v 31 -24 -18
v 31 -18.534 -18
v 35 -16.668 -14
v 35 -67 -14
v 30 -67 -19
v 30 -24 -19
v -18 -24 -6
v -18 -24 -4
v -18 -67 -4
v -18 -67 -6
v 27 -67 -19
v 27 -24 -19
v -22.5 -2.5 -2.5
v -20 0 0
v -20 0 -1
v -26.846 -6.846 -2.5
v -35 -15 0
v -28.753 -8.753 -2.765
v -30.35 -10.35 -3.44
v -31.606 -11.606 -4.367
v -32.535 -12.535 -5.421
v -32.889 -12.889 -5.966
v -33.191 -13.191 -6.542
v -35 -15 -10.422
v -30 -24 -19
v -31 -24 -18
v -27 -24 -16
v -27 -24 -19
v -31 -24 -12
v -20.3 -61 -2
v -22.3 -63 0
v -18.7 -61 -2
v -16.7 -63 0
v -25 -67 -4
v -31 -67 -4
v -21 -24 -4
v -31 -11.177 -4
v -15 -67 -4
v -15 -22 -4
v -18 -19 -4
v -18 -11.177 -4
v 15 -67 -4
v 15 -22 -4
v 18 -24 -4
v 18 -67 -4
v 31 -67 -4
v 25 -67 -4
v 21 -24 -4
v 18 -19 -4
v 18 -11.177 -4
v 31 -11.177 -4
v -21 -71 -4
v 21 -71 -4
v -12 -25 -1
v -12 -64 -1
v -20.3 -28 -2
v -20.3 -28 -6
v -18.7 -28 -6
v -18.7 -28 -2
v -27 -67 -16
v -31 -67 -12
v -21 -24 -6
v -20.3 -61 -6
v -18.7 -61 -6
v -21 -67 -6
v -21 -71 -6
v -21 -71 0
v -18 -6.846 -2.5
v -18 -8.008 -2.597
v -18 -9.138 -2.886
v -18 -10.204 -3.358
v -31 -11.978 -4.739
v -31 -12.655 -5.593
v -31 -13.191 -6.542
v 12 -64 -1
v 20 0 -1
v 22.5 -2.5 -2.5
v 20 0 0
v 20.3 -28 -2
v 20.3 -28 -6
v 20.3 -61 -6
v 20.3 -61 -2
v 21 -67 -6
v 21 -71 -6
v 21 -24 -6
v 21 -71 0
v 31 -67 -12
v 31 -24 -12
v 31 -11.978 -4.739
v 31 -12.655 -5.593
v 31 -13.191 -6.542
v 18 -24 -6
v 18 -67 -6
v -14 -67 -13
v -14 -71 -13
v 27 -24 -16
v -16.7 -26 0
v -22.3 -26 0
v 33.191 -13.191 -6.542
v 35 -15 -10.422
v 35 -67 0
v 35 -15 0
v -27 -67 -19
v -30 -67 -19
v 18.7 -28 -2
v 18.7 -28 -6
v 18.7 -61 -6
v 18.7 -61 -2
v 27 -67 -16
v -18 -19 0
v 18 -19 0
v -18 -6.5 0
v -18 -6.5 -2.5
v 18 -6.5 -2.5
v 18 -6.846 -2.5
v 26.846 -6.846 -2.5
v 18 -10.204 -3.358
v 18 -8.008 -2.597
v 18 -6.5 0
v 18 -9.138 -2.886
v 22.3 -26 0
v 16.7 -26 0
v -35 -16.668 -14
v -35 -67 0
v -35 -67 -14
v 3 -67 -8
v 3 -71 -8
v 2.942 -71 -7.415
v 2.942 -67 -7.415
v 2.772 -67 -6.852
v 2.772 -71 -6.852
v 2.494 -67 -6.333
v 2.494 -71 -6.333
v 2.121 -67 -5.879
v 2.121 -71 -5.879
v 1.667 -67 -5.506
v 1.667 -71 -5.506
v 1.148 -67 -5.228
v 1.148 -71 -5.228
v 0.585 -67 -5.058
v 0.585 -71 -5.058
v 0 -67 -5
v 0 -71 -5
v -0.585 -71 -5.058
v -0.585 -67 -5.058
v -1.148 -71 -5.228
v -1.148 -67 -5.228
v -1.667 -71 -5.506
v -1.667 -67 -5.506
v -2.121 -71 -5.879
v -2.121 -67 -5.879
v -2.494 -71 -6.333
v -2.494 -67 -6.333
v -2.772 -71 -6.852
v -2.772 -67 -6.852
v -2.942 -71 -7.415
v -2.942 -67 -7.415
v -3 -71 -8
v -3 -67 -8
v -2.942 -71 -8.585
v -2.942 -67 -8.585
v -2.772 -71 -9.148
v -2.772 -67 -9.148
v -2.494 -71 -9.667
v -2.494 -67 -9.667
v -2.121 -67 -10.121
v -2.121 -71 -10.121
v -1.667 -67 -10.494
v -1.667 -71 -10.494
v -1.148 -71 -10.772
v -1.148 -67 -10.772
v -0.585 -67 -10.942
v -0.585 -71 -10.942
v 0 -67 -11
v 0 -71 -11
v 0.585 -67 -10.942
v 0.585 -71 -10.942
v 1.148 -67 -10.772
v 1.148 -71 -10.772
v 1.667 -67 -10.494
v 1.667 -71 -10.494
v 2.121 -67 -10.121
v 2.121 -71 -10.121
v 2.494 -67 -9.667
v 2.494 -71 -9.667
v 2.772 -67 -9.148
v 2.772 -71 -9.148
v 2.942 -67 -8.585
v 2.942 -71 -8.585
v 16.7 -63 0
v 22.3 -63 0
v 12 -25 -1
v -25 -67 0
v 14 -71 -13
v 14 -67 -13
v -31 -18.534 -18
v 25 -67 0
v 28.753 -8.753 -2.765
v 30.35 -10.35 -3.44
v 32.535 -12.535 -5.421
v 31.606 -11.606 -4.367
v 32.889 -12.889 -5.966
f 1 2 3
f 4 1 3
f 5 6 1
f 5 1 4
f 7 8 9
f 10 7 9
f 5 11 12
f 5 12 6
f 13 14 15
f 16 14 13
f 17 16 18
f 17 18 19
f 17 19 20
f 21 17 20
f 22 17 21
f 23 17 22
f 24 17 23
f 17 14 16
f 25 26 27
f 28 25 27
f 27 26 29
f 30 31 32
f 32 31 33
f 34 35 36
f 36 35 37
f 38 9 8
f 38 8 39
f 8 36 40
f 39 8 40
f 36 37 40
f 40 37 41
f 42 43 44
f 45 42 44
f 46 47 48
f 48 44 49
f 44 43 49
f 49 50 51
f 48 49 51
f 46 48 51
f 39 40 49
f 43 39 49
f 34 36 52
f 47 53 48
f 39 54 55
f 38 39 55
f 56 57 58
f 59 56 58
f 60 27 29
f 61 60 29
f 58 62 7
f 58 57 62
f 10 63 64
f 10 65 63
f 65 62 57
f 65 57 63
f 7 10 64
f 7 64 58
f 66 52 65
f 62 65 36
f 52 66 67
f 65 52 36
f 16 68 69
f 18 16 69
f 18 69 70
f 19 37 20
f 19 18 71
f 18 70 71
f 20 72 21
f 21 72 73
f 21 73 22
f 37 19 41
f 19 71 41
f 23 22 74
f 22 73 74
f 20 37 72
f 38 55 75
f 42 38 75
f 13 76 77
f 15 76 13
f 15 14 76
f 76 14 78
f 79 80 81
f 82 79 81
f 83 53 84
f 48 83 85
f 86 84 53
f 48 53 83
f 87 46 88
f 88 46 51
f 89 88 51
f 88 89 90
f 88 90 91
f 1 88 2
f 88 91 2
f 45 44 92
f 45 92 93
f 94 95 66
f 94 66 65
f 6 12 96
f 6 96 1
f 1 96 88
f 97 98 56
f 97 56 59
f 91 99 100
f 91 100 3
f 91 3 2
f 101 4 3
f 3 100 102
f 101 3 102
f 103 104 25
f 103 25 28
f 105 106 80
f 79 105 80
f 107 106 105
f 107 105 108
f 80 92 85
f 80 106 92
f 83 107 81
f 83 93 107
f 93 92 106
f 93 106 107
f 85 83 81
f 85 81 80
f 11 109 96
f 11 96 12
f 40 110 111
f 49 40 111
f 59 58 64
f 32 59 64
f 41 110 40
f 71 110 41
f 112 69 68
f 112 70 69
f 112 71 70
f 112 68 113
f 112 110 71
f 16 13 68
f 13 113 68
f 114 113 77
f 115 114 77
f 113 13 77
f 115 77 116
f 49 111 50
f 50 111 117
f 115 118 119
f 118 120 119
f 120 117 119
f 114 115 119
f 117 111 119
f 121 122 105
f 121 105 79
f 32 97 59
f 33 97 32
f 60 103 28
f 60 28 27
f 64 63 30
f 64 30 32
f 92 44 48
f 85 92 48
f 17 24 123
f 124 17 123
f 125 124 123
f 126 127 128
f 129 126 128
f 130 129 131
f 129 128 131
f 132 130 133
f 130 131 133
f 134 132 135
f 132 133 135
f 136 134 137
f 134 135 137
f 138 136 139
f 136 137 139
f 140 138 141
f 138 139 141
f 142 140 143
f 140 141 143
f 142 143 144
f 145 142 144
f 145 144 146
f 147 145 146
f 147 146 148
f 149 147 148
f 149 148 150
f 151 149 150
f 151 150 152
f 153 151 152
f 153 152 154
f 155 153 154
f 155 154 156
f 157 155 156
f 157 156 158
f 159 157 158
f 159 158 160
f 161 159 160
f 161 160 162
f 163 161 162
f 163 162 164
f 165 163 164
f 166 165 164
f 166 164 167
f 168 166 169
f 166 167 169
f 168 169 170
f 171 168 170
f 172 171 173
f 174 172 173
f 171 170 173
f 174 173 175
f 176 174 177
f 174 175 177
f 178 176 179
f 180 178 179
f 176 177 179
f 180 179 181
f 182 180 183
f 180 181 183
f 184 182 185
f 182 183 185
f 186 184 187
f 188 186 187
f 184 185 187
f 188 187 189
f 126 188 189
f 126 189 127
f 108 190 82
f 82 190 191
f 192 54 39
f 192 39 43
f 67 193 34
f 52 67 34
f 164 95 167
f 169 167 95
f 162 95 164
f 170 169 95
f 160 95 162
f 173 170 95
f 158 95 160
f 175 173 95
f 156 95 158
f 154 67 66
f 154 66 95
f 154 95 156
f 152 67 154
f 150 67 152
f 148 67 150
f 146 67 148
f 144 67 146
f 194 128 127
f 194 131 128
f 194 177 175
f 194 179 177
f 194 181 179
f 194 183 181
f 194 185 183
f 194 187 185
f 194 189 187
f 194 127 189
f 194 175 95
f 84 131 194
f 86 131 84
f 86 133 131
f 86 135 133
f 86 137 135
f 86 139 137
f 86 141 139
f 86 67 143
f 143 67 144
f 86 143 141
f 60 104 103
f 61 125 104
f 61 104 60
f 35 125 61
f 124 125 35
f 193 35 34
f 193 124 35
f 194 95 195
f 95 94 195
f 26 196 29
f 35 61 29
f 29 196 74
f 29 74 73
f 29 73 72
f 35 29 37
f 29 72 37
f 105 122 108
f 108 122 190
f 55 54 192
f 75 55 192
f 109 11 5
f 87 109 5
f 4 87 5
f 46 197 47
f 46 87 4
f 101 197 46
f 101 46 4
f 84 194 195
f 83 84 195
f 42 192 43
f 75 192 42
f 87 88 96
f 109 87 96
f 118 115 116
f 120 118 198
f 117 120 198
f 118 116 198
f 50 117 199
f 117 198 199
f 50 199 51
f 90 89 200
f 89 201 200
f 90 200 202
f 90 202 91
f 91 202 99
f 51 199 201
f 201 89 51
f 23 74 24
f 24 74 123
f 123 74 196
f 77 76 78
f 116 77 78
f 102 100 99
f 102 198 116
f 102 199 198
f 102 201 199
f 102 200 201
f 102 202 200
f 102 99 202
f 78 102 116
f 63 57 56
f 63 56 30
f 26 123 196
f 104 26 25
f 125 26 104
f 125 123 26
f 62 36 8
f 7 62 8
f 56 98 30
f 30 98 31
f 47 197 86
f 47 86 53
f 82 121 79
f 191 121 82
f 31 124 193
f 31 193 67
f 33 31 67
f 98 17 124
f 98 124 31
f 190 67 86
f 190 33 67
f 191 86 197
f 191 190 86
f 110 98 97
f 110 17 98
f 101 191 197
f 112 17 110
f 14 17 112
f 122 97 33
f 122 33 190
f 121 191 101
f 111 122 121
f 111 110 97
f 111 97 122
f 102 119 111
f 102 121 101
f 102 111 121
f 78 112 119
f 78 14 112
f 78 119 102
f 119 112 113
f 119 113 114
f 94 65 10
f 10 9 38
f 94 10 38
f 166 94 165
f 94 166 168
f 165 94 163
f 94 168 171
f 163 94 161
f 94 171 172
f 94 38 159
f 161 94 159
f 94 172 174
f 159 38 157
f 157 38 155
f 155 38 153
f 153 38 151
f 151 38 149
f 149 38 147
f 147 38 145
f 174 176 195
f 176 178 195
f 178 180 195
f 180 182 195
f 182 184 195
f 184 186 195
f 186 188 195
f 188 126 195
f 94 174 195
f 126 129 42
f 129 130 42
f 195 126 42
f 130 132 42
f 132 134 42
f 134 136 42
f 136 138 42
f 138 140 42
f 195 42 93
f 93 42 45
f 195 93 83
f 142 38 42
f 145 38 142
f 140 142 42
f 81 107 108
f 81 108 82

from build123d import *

# Parameters (mm, degrees)
F1_DEPTH  = 67
F3_DEPTH  = 70.001
F4_W      = 36
F4_H      = 12.5
F5_DEPTH  = 25
F6_W      = 3
F6_H      = 43
F7_DEPTH  = 2
F8_W      = 1.6
F8_H      = 33
F9_DEPTH  = 6.001
F10_W     = 42
F10_H     = 4
F11_DEPTH = 13
F13_SIZE  = 5
F14_SIZE  = 3.99999
F15_SIZE  = 15
F16_SIZE  = 7
F12_R     = 3
F17_DEPTH = 71.001
F18_W     = 30
F18_H     = 45
F19_DEPTH = 3
F20_SIZE  = 2.99999
F21_SIZE  = 2
F22_SIZE2 = 1.5
F22_SIZE  = 2.5
F24_START = -43
F23_W     = 62
F23_H     = 16.8932331726
F24_DEPTH = 57


# Not quite as in the source:
# - a fillet or chamfer is up to 0.001 mm smaller than in the source, because OpenCascade refuses the exact size


with BuildPart() as f1:
    # F0 (on Front) → F1 (new body)
    with BuildSketch(Plane.XZ):
        Polygon((35, 0), (-35, 0), (-35, -19), (-27, -19), (-27, -16), (-31, -12), (-31, -4), (31, -4), (31, -12), (27, -16), (27, -19), (35, -19), align=None)
    extrude(amount=F1_DEPTH)

    # F2 (on face) → F3 (cut, through all)
    with BuildSketch(Plane.YZ.offset(35)):
        with BuildLine():
            Line((-13.190586324, -6.5416721678), (-19, -19))
            Line((-19, -19), (4.1351475573, -19))
            Line((4.1351475573, -19), (4.1351475573, -2.5))
            Line((4.1351475573, -2.5), (-6.8464318148, -2.5))
            ThreePointArc((-6.8464318148, -2.5), (-10.6075290732, -3.5962598793), (-13.190586324, -6.5416721678))
        make_face()
    extrude(amount=-F3_DEPTH, mode=Mode.SUBTRACT)

    # F4 (on face) → F5 (cut)
    with BuildSketch(Plane.XY):
        with Locations((0, -12.75)):
            Rectangle(F4_W, F4_H)
    extrude(amount=-F5_DEPTH, mode=Mode.SUBTRACT)

    # F6 (on face) → F7 (join)
    with BuildSketch(Plane(origin=(0, 0, -4), x_dir=(1, 0, 0), z_dir=(0, 0, -1))):
        with Locations((-19.5, 45.5)):
            Rectangle(F6_W, F6_H)
        with Locations((19.5, 45.5)):
            Rectangle(F6_W, F6_H)
    extrude(amount=F7_DEPTH)

    # F8 (on face) → F9 (cut, through all)
    with BuildSketch(Plane(origin=(0, 0, -6), x_dir=(1, 0, 0), z_dir=(0, 0, -1))):
        with Locations((-19.5, 44.5)):
            Rectangle(F8_W, F8_H)
        with Locations((19.5, 44.5)):
            Rectangle(F8_W, F8_H)
    extrude(amount=-F9_DEPTH, mode=Mode.SUBTRACT)

    # F10 (on face) → F11 (join)
    with BuildSketch(Plane.XY):
        with Locations((0, -69)):
            Rectangle(F10_W, F10_H)
    extrude(amount=-F11_DEPTH)

    # F13
    f13_edges = [f1.edges().sort_by_distance(p)[0] for p in [
        (-35, -43, -19),
        (35, -43, -19),
    ]]
    chamfer(f13_edges, length=F13_SIZE)

    # F14 (size 4 in the source; OpenCascade refuses exactly that, so slightly less here)
    f14_edges = [f1.edges().sort_by_distance(p)[0] for p in [
        (-21, -67, -2),
        (21, -67, -2),
    ]]
    chamfer(f14_edges, length=F14_SIZE)

    # F15
    f15_edges = [f1.edges().sort_by_distance(p)[0] for p in [
        (35, 0, -1.25),
        (-35, 0, -1.25),
    ]]
    chamfer(f15_edges, length=F15_SIZE)

    # F16
    f16_edges = [f1.edges().sort_by_distance(p)[0] for p in [
        (-21, -69, -13),
        (21, -69, -13),
    ]]
    chamfer(f16_edges, length=F16_SIZE)

    # F12 (on face) → F17 (cut, through all)
    with BuildSketch(Plane.XZ.offset(71)):
        with Locations((0, -8)):
            Circle(F12_R)
    extrude(amount=-F17_DEPTH, mode=Mode.SUBTRACT)

    # F18 (on face) → F19 (cut)
    with BuildSketch(Plane(origin=(0, 0, -4), x_dir=(1, 0, 0), z_dir=(0, 0, -1))):
        with Locations((0, 44.5)):
            Rectangle(F18_W, F18_H)
    extrude(amount=-F19_DEPTH, mode=Mode.SUBTRACT)

    # F20 (size 3 in the source; OpenCascade refuses exactly that, so slightly less here)
    f20_edges = [f1.edges().sort_by_distance(p)[0] for p in [
        (0, -67, -1),
        (-15, -44.5, -1),
        (0, -22, -1),
        (15, -44.5, -1),
    ]]
    chamfer(f20_edges, length=F20_SIZE)

    # F21
    f21_edges = [f1.edges().sort_by_distance(p)[0] for p in [
        (20.3, -44.5, 0),
        (18.7, -44.5, 0),
        (19.5, -28, 0),
        (19.5, -61, 0),
        (-18.7, -44.5, 0),
        (-19.5, -28, 0),
        (-19.5, -61, 0),
        (-20.3, -44.5, 0),
    ]]
    chamfer(f21_edges, length=F21_SIZE)

    # F22
    f22_edges = [f1.edges().sort_by_distance(p)[0] for p in [
        (0, 0, -2.5),
    ]]
    f22_side = f1.faces().sort_by_distance((0, -3.465238, -2.5))[0]
    chamfer(f22_edges, length=F22_SIZE, length2=F22_SIZE2, reference=f22_side)

    # F23 (on face) → F24 (cut)
    with BuildSketch(Plane.XZ.offset(67).offset(F24_START)):
        with Locations((0, -17.7232683636)):
            Rectangle(F23_W, F23_H)
    extrude(amount=-F24_DEPTH, mode=Mode.SUBTRACT)


solid = f1.part
